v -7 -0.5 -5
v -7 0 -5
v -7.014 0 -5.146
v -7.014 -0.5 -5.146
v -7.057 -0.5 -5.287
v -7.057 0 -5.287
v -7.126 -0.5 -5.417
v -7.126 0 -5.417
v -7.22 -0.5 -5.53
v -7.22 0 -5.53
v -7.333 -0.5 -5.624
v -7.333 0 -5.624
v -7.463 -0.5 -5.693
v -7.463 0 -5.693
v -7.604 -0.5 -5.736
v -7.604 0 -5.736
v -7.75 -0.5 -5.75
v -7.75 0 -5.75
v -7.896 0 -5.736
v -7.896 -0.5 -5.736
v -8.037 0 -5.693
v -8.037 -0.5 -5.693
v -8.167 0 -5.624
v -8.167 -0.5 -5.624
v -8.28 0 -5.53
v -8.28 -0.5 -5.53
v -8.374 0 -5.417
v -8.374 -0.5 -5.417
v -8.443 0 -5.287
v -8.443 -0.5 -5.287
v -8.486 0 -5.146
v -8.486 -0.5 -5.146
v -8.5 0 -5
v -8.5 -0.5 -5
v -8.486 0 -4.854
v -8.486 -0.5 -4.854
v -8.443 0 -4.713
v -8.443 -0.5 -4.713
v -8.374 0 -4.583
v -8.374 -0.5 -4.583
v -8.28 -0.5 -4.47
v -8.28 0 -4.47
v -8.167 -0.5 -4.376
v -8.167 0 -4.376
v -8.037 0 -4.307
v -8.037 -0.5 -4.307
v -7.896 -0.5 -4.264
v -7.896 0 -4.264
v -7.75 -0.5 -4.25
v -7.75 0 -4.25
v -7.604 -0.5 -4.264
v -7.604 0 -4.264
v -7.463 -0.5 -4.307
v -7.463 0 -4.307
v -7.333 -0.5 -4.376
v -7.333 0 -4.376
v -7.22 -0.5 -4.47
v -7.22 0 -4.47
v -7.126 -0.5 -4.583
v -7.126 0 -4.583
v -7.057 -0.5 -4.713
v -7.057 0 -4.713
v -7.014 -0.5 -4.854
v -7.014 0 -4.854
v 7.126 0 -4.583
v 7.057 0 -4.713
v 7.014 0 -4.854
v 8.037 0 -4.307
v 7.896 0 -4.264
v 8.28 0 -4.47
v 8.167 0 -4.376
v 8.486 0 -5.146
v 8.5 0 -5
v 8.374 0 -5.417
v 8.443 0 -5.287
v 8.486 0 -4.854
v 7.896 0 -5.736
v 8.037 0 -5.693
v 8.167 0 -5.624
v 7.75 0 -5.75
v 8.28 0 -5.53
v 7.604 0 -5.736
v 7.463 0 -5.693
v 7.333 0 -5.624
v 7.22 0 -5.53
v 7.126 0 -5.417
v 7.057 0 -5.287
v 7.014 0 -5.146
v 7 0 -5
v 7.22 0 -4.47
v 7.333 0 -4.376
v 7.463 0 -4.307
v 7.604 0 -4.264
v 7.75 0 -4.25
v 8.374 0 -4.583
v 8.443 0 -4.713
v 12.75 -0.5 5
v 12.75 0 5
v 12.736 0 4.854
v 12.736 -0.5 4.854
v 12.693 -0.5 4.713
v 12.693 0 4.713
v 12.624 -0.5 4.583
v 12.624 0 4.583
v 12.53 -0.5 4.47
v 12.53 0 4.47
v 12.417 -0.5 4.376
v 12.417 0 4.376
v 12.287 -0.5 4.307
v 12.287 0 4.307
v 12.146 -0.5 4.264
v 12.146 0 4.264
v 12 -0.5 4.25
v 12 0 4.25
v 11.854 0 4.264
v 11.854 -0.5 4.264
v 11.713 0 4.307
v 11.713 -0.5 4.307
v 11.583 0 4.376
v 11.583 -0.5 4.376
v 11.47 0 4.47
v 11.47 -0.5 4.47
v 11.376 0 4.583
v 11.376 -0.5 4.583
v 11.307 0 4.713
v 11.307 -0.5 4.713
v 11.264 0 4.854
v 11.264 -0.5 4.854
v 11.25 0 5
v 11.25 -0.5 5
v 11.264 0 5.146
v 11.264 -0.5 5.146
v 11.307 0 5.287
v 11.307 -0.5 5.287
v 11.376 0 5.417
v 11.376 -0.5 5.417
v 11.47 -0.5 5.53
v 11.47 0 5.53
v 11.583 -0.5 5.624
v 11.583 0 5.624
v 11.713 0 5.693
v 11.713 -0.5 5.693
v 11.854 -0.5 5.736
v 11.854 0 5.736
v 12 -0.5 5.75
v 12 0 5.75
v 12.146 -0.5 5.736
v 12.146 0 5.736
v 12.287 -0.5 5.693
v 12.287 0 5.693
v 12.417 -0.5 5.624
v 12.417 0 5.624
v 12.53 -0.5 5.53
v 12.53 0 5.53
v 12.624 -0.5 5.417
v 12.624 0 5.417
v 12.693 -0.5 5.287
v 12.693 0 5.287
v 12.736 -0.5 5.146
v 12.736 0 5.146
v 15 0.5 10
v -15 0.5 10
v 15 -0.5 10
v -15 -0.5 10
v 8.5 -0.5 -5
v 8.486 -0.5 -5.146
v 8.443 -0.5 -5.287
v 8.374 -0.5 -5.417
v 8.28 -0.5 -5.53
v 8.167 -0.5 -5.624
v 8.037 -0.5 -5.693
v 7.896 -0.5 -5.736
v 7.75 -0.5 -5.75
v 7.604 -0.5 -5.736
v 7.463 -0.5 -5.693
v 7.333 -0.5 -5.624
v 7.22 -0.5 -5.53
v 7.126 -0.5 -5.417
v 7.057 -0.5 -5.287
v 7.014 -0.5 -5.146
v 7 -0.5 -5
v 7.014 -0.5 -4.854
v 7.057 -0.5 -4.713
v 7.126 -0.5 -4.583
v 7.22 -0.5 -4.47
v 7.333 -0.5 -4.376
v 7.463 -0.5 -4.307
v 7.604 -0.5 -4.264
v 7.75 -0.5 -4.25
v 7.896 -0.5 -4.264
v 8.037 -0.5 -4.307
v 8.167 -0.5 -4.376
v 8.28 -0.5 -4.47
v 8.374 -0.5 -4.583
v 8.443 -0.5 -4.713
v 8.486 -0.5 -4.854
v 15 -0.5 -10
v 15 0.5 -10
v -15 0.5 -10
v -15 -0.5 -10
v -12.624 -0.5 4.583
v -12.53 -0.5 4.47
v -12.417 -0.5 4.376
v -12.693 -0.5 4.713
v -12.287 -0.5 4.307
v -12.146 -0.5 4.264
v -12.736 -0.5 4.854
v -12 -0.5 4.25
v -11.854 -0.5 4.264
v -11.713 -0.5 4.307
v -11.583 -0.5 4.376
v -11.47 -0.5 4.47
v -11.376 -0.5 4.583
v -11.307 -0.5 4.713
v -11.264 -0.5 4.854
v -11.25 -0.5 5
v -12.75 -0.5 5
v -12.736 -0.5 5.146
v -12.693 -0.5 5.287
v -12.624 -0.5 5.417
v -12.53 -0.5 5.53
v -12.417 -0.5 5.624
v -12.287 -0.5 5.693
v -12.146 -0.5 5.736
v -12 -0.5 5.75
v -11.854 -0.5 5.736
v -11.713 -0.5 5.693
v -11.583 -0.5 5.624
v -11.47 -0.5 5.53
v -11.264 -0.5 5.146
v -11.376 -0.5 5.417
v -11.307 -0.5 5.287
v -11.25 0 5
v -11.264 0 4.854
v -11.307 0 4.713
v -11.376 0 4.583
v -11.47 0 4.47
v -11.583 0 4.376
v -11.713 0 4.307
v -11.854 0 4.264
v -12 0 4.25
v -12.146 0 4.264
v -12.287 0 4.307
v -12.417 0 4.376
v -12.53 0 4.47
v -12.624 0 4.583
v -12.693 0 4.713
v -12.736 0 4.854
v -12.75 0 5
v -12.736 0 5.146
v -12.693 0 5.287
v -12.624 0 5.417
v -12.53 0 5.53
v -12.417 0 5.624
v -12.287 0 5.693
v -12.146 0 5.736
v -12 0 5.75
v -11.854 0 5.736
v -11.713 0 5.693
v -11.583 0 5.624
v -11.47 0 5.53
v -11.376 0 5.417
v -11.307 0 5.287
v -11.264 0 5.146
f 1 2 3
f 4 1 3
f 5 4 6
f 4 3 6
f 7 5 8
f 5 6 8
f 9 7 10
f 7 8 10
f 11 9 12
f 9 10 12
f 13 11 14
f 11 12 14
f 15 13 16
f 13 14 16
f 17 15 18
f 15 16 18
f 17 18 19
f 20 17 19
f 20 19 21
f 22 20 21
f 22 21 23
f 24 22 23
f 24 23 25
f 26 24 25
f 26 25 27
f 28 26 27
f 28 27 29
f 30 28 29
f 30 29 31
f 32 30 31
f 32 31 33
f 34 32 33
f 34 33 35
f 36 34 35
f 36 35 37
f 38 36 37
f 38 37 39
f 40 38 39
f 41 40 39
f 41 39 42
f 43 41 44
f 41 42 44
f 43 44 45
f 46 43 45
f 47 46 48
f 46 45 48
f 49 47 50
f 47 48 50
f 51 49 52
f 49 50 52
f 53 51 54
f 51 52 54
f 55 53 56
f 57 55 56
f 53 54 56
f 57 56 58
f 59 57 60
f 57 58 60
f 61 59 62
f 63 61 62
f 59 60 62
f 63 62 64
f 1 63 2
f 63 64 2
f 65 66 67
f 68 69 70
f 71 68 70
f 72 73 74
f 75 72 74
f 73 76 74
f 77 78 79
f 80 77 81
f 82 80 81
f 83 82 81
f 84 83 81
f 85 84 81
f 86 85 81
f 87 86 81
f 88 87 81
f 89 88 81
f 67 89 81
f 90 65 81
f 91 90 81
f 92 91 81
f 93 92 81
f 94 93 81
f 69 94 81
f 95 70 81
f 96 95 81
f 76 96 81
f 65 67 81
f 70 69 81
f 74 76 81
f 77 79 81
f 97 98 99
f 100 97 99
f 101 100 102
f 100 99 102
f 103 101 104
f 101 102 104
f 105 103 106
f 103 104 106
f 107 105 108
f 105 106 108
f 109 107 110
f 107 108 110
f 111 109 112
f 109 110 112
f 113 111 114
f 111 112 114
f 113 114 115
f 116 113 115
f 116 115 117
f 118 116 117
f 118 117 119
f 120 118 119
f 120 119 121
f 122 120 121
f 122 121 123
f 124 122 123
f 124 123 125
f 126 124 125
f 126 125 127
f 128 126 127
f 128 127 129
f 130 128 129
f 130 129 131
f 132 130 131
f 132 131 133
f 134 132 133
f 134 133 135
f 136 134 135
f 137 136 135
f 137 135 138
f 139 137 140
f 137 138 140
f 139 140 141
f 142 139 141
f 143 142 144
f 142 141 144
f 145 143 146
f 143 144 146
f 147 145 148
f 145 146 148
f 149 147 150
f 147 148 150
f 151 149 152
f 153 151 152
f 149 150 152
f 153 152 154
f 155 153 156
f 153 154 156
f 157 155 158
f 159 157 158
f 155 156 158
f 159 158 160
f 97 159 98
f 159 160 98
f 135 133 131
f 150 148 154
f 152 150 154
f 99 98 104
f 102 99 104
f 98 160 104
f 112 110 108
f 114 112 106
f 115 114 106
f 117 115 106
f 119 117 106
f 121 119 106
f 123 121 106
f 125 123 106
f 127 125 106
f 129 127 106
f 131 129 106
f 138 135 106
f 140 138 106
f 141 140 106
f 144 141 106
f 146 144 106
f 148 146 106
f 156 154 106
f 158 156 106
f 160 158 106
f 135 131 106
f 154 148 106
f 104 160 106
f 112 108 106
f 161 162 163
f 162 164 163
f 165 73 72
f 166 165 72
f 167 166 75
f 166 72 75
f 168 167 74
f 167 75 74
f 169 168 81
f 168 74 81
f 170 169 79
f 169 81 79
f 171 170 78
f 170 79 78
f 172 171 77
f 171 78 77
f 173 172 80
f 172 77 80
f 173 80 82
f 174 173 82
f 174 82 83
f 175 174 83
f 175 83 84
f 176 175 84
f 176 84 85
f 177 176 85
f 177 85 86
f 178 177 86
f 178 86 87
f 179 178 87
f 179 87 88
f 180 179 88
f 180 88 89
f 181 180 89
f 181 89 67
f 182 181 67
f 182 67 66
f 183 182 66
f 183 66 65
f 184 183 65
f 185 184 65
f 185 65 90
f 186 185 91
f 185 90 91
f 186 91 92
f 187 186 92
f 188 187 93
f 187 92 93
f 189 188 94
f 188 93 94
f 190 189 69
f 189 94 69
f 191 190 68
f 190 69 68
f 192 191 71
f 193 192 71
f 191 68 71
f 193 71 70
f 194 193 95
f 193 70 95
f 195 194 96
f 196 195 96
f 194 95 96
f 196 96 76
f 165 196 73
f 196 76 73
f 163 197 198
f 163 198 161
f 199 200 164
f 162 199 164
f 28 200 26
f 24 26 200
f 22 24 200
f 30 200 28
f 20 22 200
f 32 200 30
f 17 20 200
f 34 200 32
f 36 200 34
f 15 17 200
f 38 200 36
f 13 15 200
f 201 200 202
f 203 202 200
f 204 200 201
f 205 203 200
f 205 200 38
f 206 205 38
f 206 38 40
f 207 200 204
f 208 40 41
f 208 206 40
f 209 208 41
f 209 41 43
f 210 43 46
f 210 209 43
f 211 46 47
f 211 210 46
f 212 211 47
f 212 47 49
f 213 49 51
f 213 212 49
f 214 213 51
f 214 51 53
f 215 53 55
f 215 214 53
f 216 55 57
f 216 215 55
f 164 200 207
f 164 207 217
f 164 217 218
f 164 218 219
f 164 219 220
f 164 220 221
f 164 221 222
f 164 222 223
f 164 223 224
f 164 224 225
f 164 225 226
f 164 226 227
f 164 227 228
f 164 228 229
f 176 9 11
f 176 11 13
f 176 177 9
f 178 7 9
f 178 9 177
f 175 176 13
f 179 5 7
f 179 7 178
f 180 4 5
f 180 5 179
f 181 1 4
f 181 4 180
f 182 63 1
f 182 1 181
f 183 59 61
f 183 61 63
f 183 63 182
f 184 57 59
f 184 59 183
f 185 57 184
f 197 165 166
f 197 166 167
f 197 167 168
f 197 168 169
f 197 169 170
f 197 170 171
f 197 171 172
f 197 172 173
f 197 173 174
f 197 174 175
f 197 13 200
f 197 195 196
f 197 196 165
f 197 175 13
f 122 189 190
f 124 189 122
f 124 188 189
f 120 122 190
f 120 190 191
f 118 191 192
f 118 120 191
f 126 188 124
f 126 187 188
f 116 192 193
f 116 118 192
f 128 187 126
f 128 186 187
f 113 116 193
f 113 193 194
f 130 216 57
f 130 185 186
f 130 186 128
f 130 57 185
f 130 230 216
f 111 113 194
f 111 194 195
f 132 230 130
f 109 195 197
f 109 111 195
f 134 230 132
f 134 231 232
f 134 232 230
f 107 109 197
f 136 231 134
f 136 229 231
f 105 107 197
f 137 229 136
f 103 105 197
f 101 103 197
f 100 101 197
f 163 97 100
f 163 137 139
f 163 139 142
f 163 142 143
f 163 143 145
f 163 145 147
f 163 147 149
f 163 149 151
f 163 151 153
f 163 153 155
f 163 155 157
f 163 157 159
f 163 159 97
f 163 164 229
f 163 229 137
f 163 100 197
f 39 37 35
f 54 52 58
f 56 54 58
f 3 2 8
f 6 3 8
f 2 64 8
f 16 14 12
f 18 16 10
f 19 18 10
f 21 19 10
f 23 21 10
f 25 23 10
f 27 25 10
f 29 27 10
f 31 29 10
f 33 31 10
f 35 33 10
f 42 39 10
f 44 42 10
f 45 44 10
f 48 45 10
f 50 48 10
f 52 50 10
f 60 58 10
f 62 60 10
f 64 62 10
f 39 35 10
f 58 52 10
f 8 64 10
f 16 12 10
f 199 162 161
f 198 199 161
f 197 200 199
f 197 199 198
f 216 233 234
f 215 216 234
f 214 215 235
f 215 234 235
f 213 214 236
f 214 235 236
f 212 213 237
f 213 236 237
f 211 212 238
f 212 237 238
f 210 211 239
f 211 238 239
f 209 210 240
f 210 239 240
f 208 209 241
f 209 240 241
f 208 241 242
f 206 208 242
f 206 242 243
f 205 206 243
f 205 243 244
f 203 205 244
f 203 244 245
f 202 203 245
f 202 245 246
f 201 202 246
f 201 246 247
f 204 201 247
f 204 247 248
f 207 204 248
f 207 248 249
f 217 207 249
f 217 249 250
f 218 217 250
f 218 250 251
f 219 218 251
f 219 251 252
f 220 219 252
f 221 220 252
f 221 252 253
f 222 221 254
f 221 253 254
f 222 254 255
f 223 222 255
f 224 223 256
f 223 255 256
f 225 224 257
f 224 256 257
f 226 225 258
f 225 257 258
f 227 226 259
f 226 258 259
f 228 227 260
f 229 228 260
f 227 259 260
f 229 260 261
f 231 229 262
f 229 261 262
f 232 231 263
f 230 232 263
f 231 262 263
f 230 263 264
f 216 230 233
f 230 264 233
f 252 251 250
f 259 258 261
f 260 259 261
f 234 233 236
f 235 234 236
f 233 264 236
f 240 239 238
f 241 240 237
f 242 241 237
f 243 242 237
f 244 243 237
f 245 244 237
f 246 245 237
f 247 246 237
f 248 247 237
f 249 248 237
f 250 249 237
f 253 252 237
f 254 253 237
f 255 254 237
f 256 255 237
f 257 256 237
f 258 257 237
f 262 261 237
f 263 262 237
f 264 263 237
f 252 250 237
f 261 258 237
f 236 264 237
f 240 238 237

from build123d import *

# Parameters (mm, degrees)
F0_W     = 30
F0_H     = 20
F1_DEPTH = 0.5
F2_D     = 1.5
F2_DEPTH = 0.501


with BuildPart() as f1:
    # F0 (on Front) → F1 (new body, symmetric)
    with BuildSketch(Plane.XZ):
        Rectangle(F0_W, F0_H)
    extrude(amount=F1_DEPTH, both=True)

    # F2 (through all, one way)
    with BuildSketch(Plane(origin=(0, 0, 0), x_dir=(1, 0, 0), z_dir=(0, 1, 0))):
        with Locations((-12, -5), (12, -5), (7.75, 5), (-7.75, 5)):
            Circle(F2_D / 2)
    extrude(amount=-F2_DEPTH, mode=Mode.SUBTRACT)


solid = f1.part
